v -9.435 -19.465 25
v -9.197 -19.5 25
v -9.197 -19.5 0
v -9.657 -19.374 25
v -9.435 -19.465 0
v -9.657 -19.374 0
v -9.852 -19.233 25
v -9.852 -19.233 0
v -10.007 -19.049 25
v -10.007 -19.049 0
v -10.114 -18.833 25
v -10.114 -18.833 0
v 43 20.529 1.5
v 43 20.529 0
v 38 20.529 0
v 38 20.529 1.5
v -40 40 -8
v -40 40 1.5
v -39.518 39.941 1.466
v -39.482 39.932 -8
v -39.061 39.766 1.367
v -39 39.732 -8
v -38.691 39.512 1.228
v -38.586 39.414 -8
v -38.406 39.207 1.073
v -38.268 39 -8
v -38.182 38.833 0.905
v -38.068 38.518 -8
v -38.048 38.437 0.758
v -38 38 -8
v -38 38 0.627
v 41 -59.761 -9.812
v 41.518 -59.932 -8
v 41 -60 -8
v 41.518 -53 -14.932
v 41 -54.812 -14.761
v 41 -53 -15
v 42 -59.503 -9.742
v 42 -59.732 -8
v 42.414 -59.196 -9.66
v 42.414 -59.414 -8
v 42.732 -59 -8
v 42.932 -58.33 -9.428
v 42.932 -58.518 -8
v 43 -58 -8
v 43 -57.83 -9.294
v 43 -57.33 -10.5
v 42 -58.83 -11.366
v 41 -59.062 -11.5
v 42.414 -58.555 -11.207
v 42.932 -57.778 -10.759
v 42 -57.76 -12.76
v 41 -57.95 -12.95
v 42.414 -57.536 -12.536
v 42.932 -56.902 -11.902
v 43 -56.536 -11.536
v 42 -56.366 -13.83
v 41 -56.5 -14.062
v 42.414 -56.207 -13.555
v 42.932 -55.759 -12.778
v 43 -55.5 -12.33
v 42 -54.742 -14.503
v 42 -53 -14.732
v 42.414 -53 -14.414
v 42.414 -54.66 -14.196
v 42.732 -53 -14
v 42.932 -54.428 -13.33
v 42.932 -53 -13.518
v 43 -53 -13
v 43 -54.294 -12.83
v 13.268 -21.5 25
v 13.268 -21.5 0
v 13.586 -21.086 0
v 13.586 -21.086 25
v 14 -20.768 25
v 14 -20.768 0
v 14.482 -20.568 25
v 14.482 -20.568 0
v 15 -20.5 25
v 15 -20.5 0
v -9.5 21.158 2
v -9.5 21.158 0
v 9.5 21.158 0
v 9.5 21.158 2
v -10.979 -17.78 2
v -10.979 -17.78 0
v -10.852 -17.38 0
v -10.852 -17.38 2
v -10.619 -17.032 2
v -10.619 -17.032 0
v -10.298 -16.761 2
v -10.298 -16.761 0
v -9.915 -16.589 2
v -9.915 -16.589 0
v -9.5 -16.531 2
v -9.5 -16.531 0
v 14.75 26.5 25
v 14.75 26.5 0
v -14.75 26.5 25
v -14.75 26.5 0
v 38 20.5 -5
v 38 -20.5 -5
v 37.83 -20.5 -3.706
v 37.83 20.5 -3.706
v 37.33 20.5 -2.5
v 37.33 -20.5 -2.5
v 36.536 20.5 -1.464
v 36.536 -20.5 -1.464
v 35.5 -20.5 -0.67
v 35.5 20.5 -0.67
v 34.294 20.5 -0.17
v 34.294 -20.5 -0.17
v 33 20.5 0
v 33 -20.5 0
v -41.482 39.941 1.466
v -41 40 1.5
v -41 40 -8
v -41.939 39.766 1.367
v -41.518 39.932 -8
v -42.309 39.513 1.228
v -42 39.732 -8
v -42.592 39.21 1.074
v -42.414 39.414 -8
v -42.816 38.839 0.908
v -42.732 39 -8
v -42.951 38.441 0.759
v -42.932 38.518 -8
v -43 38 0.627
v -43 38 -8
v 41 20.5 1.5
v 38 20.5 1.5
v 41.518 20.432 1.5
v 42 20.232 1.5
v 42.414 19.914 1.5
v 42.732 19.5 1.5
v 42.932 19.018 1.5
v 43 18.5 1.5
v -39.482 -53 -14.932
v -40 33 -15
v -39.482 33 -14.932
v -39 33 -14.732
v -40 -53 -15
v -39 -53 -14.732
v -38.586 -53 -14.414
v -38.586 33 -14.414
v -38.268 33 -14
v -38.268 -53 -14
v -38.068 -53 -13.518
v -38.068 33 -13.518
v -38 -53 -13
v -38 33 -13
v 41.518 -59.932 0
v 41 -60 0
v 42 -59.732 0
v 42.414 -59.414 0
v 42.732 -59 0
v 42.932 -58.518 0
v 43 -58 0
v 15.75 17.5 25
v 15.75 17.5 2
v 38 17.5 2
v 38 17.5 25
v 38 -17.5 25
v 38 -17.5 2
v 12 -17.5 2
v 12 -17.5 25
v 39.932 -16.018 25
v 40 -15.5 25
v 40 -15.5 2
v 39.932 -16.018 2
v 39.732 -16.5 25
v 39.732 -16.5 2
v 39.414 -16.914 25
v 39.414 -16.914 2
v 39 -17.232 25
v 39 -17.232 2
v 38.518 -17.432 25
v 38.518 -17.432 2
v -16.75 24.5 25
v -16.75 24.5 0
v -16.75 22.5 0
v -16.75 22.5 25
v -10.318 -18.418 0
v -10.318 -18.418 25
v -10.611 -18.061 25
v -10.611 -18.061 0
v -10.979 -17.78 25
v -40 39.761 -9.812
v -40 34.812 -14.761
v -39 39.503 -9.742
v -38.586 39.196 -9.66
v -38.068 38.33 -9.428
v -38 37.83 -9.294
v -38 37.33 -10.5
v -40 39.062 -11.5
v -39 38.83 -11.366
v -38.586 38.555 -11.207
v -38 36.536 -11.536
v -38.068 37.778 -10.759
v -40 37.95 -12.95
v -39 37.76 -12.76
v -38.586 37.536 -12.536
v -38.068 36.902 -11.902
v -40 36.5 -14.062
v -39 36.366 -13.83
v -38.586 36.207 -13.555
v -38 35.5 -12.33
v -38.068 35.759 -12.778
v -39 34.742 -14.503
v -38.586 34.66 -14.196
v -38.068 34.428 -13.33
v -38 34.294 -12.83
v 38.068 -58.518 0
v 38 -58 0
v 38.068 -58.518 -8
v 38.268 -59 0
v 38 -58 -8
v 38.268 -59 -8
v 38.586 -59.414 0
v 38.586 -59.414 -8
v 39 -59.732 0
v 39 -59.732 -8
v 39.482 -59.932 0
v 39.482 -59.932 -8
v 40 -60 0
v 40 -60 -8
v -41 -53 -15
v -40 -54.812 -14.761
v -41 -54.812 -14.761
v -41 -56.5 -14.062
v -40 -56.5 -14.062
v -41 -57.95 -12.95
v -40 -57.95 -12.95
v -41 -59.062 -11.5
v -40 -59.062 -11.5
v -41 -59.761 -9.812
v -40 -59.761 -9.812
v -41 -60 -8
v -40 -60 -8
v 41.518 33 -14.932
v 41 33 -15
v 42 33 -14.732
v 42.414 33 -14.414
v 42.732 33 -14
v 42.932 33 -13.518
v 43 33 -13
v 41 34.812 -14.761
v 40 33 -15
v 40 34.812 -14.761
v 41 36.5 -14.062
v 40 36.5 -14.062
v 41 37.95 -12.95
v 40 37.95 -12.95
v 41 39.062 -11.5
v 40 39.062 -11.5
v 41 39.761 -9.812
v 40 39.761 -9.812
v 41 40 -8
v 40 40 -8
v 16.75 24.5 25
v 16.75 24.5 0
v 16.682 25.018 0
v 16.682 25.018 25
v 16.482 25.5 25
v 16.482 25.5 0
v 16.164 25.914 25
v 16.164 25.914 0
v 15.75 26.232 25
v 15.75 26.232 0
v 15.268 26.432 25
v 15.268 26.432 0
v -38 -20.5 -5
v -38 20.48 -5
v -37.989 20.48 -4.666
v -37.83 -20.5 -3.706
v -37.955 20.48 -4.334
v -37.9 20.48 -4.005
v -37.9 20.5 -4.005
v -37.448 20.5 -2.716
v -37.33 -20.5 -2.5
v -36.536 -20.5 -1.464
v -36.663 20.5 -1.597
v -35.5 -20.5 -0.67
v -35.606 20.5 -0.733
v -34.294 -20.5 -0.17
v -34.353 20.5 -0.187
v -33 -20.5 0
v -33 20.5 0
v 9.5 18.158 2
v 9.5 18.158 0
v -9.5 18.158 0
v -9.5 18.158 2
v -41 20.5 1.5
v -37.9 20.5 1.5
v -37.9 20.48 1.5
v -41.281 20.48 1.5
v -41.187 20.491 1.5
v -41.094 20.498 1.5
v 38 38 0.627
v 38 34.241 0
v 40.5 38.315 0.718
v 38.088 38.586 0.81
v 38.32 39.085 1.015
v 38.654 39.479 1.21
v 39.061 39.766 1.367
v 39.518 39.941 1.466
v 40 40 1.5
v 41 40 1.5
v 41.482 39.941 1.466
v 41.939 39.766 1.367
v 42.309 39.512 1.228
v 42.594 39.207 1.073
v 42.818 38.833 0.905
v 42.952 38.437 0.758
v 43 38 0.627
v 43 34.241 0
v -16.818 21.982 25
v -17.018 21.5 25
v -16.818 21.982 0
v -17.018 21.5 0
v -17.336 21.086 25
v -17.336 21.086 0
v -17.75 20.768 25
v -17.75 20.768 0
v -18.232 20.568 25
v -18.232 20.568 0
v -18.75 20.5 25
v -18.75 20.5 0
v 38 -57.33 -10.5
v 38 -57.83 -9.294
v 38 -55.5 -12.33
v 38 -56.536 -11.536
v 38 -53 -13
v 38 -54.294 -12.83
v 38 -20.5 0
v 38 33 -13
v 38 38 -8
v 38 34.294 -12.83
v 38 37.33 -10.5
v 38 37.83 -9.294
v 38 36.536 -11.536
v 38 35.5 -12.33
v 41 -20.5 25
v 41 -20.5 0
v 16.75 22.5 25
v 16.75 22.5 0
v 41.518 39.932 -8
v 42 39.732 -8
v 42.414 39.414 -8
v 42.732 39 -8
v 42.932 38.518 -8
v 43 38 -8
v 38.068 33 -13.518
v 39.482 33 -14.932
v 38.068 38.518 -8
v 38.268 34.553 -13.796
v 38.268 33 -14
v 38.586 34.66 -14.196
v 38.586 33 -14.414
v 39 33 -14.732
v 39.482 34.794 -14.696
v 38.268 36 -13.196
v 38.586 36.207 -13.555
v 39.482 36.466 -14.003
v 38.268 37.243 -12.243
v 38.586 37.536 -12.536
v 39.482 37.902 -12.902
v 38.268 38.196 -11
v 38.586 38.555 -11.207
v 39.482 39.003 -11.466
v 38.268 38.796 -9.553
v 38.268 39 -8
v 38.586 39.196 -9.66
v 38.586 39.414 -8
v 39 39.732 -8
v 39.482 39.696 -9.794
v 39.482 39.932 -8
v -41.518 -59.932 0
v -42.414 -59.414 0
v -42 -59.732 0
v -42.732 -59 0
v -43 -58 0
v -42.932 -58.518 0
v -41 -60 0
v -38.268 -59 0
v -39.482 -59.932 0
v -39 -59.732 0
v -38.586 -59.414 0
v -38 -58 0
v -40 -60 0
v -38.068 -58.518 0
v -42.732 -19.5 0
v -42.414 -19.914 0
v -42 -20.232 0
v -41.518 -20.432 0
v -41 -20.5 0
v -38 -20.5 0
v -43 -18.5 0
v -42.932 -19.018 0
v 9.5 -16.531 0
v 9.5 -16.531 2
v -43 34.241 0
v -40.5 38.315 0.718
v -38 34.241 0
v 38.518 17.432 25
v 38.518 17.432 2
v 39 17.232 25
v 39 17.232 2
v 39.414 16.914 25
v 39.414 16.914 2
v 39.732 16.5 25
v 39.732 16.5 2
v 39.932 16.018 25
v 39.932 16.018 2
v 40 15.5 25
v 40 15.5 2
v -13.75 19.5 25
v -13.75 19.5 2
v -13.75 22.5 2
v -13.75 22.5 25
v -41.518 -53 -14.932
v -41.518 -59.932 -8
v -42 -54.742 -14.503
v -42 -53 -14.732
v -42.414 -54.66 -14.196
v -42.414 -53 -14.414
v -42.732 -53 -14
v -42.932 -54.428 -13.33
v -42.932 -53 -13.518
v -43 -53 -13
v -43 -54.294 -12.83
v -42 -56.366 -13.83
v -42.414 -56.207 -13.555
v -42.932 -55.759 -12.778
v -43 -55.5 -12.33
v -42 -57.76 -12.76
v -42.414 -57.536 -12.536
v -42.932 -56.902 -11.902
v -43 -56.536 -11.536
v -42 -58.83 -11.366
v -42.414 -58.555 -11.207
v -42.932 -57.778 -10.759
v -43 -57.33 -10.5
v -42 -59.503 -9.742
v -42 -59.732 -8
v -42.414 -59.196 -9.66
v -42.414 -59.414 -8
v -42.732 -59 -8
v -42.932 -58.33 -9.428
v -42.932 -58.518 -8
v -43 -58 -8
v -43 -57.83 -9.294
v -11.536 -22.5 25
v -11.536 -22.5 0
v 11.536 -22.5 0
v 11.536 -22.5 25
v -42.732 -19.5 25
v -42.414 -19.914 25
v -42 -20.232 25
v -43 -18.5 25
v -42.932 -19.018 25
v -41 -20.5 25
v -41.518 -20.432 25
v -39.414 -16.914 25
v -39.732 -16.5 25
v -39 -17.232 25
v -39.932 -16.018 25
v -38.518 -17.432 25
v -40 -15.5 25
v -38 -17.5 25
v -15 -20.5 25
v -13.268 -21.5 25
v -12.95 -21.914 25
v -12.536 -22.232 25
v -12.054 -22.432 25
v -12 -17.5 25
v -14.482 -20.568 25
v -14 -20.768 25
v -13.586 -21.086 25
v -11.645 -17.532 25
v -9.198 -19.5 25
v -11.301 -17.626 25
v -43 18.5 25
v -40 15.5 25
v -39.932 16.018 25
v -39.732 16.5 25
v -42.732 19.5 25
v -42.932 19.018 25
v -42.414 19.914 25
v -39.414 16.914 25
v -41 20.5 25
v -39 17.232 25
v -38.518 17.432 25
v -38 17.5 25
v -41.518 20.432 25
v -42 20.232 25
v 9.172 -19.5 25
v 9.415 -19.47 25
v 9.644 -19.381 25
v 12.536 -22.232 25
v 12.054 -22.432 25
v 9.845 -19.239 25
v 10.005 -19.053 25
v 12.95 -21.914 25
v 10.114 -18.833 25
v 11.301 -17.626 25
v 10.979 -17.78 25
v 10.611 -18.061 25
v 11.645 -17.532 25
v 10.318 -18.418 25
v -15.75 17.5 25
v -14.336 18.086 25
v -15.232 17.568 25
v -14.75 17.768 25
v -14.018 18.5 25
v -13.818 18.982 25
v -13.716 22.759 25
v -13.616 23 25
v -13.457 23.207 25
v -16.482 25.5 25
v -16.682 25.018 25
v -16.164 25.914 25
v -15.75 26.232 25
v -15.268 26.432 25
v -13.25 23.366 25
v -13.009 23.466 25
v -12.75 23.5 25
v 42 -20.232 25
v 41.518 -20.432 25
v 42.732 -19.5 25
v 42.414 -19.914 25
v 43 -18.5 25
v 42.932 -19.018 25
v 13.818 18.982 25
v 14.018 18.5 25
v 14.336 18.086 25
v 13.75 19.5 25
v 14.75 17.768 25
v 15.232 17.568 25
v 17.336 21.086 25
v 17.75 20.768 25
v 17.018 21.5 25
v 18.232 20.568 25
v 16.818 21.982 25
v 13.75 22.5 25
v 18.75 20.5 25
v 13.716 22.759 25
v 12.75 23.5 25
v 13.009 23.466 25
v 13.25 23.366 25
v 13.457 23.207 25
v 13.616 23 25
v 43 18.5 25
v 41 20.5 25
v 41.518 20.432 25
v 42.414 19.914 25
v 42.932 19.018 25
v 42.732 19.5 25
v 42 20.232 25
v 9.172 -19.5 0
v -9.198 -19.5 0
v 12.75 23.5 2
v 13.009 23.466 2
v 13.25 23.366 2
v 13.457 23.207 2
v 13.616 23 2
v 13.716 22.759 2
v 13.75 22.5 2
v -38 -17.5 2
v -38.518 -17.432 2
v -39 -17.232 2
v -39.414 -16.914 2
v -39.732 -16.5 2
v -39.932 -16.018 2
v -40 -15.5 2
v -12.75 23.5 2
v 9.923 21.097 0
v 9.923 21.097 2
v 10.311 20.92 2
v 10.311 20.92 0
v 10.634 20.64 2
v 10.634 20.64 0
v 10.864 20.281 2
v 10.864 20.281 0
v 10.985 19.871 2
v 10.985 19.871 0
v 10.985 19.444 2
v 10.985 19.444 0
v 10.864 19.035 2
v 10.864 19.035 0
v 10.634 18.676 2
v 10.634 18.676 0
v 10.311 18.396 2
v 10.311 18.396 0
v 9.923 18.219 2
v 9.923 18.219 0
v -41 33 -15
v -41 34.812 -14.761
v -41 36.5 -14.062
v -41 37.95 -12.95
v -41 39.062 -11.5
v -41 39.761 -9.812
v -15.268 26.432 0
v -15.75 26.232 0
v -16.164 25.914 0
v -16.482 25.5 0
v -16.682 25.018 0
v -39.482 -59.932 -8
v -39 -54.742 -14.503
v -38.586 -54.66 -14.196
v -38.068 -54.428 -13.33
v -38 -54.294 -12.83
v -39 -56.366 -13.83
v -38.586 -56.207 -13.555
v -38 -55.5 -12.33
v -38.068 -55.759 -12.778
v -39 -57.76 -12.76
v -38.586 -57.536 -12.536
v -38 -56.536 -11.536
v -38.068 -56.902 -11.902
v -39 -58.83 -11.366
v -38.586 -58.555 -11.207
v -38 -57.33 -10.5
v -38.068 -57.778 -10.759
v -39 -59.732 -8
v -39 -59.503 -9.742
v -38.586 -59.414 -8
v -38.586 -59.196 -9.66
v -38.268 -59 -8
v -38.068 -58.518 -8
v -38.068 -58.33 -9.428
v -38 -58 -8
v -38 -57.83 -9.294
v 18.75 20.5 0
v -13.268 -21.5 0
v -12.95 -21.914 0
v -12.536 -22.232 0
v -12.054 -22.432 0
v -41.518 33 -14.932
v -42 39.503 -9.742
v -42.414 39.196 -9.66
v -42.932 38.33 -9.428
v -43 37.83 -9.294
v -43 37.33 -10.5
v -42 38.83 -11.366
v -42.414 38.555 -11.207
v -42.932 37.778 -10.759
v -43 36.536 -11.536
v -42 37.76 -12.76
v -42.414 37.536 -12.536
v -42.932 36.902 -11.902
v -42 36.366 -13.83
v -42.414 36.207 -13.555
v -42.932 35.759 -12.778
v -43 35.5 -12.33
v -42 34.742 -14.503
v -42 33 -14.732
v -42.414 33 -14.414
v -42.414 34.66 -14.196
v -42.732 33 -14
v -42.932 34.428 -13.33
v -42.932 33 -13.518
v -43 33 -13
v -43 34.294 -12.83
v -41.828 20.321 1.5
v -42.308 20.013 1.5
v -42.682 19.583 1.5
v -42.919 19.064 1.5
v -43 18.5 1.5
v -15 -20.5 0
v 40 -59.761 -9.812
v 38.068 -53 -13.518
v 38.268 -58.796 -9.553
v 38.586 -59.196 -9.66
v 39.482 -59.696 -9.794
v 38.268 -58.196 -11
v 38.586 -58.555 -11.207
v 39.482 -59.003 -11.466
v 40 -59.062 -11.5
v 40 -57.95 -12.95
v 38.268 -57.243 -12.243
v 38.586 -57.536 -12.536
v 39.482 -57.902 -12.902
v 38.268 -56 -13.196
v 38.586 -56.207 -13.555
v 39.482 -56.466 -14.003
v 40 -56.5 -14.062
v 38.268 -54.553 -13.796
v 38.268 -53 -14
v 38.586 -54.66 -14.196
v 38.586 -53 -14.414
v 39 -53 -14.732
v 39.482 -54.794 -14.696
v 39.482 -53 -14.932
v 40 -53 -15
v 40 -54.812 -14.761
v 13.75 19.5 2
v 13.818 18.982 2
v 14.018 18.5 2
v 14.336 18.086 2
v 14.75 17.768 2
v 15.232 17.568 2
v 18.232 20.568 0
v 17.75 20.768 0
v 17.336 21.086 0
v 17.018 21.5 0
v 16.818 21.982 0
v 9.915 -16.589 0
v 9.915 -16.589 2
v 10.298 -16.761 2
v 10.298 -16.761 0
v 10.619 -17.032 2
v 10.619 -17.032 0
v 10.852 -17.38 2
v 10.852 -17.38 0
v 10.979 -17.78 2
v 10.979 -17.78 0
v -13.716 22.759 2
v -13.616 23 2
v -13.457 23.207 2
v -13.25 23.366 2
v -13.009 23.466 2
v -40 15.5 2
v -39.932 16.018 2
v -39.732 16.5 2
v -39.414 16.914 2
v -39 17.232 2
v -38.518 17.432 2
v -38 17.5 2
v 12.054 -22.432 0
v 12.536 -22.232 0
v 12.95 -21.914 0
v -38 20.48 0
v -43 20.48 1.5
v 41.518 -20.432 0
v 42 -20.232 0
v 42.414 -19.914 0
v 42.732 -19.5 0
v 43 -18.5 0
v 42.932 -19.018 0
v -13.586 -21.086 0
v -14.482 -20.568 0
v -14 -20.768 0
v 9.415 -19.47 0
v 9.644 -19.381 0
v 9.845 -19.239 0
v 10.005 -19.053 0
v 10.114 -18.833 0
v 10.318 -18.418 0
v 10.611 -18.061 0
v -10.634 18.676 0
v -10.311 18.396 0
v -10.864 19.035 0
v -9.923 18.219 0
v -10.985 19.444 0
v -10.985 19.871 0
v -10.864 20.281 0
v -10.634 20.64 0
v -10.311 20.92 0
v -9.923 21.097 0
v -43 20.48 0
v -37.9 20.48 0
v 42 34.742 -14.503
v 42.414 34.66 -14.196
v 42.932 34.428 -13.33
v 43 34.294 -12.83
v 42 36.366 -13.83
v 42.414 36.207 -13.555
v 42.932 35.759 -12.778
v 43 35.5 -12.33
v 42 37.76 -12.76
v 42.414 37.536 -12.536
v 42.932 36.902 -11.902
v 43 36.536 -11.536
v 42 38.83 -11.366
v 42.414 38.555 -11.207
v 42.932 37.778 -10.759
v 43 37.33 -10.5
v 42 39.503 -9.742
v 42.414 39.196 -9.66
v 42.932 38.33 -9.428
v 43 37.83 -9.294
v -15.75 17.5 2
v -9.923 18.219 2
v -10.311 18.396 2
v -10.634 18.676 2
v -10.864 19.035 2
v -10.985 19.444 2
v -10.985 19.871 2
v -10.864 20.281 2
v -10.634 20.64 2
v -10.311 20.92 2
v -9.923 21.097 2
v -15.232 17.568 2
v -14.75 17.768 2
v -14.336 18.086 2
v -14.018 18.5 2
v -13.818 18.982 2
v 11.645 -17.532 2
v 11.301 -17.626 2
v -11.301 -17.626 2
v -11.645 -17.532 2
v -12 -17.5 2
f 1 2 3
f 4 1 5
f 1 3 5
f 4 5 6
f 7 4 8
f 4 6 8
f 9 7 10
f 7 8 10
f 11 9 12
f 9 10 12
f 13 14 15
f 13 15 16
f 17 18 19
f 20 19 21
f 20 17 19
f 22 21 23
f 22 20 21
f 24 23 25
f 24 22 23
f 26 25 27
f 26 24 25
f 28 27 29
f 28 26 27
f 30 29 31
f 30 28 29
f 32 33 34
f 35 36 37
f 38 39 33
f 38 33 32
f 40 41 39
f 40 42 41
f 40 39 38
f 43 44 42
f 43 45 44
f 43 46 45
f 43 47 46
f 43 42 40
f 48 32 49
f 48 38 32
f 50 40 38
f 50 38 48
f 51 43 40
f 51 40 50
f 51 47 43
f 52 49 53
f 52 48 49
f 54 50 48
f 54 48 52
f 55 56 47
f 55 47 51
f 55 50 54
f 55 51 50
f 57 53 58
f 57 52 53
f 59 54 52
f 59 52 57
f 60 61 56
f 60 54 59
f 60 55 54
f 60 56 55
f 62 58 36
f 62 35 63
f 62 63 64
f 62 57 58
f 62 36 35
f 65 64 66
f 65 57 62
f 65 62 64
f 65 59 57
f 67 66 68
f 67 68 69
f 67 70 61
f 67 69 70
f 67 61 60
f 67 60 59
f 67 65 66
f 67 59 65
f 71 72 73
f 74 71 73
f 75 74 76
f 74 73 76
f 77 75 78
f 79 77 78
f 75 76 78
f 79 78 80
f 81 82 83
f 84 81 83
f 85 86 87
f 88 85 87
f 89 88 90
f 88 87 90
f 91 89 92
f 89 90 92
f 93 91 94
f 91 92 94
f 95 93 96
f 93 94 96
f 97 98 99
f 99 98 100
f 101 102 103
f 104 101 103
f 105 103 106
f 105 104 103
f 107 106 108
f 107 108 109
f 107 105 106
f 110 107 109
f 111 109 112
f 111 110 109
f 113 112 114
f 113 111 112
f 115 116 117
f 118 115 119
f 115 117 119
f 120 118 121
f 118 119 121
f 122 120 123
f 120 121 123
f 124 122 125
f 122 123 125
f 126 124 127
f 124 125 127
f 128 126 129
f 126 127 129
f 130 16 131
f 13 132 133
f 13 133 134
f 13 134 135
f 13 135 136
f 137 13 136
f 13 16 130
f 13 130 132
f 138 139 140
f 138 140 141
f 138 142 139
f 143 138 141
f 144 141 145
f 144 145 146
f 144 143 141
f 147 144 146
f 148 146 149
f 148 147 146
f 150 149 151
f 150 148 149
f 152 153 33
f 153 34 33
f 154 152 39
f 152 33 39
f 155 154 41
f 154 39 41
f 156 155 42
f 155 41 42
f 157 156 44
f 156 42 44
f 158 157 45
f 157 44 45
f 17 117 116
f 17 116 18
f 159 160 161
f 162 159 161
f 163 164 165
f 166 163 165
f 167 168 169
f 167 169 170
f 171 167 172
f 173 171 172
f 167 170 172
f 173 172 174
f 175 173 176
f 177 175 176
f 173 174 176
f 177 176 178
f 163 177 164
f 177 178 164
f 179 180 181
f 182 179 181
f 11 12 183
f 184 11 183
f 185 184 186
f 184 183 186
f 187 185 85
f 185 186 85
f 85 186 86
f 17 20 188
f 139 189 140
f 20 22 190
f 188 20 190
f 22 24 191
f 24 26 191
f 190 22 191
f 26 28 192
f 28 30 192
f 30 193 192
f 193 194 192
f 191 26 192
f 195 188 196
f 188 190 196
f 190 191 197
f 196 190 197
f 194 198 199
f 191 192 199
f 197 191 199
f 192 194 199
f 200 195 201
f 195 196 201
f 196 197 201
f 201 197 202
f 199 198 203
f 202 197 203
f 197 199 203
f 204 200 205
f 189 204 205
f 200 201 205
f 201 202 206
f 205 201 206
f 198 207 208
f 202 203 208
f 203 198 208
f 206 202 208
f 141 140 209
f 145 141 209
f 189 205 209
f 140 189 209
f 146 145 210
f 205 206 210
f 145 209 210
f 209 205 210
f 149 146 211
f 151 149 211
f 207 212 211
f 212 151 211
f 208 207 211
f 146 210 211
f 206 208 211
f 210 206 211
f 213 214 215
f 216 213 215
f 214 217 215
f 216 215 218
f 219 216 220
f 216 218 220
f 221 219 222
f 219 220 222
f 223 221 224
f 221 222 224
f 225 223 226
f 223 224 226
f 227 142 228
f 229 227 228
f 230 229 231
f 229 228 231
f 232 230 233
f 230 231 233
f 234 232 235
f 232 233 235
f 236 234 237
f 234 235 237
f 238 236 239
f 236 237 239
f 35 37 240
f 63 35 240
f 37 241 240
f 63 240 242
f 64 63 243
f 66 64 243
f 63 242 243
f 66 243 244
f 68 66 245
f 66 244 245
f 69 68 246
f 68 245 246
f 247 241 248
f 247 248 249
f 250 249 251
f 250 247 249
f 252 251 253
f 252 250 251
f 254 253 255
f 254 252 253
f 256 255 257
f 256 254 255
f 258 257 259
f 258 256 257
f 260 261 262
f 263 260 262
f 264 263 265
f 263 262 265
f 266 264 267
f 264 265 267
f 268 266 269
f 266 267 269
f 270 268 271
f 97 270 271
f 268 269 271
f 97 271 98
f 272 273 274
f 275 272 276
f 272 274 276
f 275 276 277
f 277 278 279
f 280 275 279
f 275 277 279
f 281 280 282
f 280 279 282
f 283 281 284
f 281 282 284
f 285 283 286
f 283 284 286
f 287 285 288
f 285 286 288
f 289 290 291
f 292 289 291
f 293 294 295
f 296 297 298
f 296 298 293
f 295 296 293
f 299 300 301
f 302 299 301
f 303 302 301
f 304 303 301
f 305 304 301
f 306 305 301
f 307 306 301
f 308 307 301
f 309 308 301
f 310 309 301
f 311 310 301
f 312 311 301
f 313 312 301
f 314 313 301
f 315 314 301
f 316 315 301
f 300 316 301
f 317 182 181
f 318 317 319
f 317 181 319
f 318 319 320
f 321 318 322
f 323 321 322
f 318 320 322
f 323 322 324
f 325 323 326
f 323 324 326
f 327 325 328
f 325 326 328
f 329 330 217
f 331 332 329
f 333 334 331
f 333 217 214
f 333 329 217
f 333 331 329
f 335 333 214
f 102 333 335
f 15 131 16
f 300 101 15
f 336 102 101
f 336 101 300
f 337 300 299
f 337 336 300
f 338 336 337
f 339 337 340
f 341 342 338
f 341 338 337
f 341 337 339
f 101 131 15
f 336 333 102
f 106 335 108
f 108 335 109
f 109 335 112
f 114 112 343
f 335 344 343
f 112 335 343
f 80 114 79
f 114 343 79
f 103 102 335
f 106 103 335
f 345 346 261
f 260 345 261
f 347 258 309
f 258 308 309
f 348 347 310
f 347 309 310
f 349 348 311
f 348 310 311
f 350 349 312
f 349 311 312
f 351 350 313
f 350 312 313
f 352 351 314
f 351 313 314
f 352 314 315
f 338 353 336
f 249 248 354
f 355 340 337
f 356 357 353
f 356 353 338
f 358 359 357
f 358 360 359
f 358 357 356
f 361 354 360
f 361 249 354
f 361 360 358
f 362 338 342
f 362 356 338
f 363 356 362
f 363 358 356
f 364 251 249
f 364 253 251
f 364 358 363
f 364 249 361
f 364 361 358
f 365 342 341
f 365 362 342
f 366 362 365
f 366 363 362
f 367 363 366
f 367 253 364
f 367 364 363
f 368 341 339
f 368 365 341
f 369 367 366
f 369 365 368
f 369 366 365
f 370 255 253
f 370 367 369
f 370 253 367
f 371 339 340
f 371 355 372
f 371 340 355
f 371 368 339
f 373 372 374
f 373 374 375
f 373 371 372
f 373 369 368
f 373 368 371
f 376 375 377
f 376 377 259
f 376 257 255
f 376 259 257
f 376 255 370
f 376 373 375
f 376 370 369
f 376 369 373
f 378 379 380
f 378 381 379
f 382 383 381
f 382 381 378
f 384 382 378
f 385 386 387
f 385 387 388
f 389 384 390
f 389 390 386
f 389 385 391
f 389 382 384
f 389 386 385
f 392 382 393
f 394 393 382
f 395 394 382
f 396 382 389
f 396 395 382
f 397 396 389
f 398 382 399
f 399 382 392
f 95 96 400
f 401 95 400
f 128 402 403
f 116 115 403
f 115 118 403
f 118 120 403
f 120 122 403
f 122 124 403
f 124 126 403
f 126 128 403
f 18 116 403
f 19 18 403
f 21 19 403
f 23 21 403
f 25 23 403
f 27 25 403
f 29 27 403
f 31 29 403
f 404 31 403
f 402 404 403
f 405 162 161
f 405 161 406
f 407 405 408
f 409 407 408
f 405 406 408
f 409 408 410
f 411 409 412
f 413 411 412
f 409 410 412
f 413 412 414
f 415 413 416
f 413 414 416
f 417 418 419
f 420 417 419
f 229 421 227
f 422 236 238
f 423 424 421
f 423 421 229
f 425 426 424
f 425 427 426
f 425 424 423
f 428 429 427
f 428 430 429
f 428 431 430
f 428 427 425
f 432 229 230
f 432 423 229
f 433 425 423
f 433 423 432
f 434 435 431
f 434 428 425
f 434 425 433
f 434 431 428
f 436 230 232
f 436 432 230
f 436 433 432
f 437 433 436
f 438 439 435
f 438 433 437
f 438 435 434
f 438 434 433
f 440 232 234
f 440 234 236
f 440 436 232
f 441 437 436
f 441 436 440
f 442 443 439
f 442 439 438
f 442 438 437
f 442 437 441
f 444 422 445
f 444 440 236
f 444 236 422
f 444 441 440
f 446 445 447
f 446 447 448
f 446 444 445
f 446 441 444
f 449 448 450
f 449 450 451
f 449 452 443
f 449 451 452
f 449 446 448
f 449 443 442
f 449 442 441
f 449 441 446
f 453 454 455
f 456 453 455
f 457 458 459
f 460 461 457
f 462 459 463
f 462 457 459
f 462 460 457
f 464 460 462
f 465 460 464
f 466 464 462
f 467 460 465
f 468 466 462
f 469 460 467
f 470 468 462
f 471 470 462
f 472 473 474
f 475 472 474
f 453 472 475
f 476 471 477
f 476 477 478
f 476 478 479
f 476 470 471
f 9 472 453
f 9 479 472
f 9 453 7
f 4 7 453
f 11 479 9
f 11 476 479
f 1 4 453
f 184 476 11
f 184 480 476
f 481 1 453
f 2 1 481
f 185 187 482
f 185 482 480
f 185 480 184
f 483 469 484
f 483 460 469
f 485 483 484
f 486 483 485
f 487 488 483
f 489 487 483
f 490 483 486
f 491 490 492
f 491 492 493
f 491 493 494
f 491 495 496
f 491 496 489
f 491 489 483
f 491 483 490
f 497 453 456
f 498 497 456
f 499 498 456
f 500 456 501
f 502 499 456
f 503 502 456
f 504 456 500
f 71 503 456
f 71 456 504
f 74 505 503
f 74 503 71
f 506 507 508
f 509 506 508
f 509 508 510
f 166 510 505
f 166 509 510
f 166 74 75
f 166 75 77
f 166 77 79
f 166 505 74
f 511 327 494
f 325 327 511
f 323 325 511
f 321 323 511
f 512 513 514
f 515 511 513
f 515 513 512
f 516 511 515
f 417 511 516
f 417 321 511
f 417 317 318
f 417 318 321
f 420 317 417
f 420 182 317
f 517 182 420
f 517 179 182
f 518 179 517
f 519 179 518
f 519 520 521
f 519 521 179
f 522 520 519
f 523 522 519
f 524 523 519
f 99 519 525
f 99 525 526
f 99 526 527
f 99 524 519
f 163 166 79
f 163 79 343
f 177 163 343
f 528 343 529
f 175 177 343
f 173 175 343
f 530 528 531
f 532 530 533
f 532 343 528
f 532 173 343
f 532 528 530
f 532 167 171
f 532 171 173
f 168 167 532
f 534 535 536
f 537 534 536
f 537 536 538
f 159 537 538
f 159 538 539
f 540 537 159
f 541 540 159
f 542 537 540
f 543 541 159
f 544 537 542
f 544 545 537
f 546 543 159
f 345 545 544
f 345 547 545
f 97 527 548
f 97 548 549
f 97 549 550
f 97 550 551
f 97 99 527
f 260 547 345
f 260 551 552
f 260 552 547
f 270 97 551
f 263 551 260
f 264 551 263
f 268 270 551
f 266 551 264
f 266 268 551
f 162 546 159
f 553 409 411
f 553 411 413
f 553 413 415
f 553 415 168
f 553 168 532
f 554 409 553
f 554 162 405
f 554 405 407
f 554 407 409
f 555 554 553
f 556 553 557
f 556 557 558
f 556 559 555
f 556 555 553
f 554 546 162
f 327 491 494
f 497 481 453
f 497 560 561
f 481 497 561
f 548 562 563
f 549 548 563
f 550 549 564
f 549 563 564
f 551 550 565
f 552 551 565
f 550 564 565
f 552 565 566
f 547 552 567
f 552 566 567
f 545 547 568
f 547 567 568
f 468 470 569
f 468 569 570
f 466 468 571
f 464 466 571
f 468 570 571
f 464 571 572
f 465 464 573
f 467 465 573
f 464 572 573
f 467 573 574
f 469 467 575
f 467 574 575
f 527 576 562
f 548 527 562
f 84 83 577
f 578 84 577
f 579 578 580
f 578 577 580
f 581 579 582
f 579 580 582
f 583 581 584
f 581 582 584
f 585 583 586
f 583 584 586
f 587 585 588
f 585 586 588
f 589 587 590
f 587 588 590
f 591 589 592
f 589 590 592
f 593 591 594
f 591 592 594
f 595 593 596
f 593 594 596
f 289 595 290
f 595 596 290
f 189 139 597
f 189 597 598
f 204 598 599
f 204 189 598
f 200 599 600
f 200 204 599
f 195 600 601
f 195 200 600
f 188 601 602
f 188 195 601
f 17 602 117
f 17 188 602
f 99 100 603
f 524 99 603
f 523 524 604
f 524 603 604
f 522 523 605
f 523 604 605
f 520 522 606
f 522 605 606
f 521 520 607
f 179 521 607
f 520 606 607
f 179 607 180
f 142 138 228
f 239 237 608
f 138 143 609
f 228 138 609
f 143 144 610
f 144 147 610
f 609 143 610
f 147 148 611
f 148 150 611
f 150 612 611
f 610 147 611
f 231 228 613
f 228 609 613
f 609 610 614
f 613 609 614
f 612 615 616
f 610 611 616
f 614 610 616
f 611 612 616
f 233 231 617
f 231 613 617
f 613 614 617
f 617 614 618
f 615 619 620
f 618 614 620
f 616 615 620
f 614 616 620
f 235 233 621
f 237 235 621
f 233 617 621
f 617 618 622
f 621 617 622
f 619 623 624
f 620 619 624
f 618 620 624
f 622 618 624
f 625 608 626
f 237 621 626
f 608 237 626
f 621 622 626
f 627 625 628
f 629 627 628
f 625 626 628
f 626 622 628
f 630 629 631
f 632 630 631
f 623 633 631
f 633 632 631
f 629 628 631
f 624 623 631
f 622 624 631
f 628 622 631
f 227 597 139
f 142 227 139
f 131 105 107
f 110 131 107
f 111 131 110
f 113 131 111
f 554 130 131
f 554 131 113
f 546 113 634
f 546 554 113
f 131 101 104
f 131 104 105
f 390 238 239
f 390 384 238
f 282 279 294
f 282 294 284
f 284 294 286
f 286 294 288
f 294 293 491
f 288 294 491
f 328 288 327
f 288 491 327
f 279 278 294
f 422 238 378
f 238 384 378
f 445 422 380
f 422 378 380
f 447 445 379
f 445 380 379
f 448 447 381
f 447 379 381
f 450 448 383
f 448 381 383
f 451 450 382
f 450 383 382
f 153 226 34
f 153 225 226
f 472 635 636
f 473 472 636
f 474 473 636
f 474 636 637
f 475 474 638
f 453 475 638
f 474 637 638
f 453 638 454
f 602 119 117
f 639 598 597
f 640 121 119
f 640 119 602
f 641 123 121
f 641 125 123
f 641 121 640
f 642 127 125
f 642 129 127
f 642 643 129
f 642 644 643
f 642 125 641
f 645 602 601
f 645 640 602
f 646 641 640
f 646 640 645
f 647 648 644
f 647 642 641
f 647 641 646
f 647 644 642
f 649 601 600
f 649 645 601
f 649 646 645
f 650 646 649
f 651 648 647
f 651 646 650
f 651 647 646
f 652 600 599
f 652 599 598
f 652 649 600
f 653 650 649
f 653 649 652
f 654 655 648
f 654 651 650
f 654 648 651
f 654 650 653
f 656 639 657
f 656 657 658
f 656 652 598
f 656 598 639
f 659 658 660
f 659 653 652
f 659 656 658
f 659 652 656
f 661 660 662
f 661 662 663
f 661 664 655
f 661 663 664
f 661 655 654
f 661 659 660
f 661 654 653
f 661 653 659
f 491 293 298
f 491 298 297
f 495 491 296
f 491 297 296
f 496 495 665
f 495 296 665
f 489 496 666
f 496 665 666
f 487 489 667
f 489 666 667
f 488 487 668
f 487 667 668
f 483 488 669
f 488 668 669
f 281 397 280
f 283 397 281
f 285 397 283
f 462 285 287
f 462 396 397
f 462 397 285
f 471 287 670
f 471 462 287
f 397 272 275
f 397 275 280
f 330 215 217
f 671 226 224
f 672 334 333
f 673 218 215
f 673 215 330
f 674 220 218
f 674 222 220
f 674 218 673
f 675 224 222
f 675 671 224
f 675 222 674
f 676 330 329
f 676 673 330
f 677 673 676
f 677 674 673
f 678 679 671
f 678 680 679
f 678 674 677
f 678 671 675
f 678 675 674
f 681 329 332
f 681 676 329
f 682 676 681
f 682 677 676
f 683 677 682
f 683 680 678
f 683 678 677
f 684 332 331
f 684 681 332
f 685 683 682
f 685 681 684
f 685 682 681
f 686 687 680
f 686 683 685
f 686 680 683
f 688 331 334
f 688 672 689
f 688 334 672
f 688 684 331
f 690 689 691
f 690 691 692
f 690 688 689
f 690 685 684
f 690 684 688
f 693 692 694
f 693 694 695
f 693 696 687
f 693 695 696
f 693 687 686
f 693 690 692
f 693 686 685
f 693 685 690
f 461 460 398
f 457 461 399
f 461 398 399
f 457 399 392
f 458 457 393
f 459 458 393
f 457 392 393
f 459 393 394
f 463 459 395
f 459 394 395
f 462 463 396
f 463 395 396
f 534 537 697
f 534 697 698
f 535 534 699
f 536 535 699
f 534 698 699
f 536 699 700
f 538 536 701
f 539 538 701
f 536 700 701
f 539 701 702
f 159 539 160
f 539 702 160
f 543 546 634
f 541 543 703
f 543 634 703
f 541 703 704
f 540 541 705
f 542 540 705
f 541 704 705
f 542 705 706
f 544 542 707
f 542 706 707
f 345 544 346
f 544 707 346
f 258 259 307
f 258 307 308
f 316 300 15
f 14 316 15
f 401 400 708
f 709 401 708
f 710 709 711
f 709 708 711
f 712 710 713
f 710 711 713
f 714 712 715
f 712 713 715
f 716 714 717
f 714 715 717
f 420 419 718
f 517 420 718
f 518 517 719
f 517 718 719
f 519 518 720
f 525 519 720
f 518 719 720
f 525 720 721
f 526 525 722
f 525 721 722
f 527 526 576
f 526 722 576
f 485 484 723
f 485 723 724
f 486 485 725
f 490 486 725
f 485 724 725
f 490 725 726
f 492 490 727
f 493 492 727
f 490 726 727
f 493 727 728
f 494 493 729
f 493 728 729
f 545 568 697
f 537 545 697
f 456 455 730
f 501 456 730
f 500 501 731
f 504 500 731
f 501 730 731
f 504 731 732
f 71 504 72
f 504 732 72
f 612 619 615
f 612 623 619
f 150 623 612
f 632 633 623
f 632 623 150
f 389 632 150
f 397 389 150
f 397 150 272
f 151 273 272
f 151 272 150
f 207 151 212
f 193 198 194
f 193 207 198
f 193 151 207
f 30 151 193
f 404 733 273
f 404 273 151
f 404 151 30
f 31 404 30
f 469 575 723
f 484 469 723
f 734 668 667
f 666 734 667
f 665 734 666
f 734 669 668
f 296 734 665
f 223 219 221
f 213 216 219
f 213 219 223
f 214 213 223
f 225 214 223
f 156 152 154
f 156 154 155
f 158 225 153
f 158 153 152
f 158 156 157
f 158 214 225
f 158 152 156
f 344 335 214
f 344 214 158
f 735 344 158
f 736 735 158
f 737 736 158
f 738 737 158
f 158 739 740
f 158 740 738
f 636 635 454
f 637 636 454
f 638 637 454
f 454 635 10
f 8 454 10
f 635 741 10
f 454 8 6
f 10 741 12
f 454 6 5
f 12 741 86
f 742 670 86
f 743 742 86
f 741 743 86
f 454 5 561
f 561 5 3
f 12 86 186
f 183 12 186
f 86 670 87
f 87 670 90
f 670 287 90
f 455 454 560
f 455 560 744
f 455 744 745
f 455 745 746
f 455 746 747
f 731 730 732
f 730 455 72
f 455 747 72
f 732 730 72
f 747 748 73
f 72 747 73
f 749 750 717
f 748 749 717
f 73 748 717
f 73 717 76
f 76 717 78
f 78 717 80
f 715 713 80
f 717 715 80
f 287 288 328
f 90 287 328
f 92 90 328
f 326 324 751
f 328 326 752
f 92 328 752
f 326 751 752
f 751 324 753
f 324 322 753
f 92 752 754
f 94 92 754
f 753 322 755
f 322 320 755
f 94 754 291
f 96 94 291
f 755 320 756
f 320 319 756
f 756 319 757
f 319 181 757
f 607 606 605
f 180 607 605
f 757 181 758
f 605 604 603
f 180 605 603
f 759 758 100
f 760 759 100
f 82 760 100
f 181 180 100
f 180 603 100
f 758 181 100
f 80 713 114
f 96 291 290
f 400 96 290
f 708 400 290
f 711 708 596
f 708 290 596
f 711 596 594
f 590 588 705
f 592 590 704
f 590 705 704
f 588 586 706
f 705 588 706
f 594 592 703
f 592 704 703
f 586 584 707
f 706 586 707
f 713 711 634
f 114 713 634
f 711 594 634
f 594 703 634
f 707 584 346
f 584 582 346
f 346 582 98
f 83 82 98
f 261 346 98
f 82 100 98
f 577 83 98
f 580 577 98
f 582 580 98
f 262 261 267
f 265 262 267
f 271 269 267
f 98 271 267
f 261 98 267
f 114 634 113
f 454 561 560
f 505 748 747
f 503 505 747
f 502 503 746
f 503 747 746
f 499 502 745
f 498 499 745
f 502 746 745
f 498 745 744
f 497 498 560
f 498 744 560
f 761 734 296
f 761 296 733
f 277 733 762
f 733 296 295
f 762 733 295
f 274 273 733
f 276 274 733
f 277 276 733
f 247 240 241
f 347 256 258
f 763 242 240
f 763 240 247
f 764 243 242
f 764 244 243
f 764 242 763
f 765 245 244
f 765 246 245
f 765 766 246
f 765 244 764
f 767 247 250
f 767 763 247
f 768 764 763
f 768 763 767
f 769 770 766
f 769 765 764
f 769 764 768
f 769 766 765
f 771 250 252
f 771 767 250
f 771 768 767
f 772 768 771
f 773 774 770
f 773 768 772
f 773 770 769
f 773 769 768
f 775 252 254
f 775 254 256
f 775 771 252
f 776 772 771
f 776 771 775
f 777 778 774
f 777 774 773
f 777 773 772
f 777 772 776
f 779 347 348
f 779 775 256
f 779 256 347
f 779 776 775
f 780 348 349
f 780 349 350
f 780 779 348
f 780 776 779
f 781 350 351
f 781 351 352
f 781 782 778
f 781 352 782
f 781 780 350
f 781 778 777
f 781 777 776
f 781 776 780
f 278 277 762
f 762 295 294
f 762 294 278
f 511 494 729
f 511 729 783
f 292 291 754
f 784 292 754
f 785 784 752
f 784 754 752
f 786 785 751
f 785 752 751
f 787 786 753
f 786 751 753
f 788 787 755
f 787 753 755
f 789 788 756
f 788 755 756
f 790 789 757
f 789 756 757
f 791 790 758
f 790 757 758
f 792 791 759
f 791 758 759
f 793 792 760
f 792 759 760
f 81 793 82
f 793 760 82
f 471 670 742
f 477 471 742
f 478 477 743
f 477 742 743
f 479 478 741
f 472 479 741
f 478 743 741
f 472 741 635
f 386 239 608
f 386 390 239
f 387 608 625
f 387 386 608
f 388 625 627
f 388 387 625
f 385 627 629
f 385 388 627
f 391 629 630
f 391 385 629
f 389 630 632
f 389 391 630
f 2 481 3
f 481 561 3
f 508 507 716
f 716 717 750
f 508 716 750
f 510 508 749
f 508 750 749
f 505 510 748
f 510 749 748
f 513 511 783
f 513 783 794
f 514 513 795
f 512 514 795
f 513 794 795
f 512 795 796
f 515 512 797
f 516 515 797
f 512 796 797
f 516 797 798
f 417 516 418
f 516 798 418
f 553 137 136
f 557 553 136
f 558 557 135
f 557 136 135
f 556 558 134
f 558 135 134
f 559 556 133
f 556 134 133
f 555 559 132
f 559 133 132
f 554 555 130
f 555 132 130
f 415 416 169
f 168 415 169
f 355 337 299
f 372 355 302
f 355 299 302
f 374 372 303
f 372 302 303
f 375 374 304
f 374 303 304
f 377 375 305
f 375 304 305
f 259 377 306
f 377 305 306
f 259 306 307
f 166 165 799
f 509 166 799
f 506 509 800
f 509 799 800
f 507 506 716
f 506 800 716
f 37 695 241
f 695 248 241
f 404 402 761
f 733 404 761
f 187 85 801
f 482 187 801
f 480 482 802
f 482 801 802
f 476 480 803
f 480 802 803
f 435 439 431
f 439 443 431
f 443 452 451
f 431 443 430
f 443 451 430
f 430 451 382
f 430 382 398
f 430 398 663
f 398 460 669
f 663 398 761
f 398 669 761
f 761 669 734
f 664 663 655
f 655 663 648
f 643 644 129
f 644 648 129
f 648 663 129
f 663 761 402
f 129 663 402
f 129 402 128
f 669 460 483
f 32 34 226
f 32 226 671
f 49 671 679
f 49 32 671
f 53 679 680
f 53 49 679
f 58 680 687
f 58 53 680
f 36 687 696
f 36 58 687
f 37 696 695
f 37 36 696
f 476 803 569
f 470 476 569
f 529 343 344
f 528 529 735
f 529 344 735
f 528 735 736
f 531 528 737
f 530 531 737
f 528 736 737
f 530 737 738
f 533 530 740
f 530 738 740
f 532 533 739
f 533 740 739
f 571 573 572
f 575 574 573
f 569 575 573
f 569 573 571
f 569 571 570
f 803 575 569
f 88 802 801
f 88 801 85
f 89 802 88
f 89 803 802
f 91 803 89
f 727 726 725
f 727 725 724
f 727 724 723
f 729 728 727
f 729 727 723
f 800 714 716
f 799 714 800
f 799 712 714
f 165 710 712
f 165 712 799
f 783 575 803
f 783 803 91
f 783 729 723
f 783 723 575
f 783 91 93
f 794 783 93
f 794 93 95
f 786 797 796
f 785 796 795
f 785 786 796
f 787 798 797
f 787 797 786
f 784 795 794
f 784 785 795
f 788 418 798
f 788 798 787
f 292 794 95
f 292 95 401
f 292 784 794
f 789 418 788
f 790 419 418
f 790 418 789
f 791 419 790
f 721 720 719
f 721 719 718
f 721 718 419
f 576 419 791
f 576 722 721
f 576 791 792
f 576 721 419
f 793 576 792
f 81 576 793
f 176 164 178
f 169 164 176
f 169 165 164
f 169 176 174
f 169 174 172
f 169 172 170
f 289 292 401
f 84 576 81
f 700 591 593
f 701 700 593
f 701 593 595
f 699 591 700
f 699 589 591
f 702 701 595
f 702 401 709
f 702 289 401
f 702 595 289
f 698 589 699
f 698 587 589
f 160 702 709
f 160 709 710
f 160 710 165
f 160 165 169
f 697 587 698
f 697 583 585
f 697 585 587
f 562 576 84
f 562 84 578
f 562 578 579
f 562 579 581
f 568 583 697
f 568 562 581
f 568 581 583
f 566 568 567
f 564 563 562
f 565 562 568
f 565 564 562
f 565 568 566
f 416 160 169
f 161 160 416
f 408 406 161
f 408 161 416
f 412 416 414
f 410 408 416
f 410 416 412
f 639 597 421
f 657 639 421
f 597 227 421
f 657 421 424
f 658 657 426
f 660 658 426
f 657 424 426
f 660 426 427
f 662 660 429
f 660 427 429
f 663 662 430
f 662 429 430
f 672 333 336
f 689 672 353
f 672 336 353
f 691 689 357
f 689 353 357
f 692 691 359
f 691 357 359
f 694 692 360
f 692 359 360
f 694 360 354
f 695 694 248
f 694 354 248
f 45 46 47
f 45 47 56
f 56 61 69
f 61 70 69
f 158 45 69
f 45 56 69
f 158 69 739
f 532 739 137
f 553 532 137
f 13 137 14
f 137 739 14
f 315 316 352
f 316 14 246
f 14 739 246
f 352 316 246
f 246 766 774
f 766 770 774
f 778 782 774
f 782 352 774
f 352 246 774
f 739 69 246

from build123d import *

# Parameters (mm, degrees)
F1_DEPTH      = 2
F2_DEPTH      = 25
F3_W          = 5
F3_H          = 60
F4_DEPTH      = 15
F3_H_2        = 40
F5_DEPTH      = 15
F5_DEPTH_BACK = 1.5
F6_R          = 7
F8_DEPTH      = 86.001
F7_W          = 6.048347801
F7_H          = 1.5
F9_DEPTH      = 5.1
F10_W         = 6
F10_H         = 1.5
F11_DEPTH     = 5.1
F12_T1_DEPTH  = 41
F12_T3_DEPTH  = 40.980202511
F12_T8_DEPTH  = 53.480202511
F13_R         = 2


# Not quite as in the source:
# - a fillet or chamfer that OpenCascade refuses, or shapes differently, is made with other operations: its cross-section is extruded or revolved along the edge and cut away or added


with BuildPart() as f1:
    # F0 (on Top) → F1 (new body)
    with BuildSketch(Plane.XY):
        with BuildLine():
            ThreePointArc((40, 15.5), (39.4142135624, 16.9142135624), (38, 17.5))
            Line((38, 17.5), (15.75, 17.5))
            ThreePointArc((15.75, 17.5), (14.3357864376, 18.0857864376), (13.75, 19.5))
            Line((13.75, 19.5), (13.75, 22.5))
            ThreePointArc((13.75, 22.5), (13.4571067812, 23.2071067812), (12.75, 23.5))
            Line((12.75, 23.5), (-12.75, 23.5))
            ThreePointArc((-12.75, 23.5), (-13.4571067812, 23.2071067812), (-13.75, 22.5))
            Line((-13.75, 22.5), (-13.75, 19.5))
            ThreePointArc((-13.75, 19.5), (-14.3357864376, 18.0857864376), (-15.75, 17.5))
            Line((-15.75, 17.5), (-38, 17.5))
            ThreePointArc((-38, 17.5), (-39.4142135624, 16.9142135624), (-40, 15.5))
            Line((-40, 15.5), (-40, -15.5))
            ThreePointArc((-40, -15.5), (-39.4142135624, -16.9142135624), (-38, -17.5))
            Line((-38, -17.5), (-12, -17.5))
            ThreePointArc((-12, -17.5), (-11.4705903261, -17.5713410366), (-10.978949287, -17.7802746029))
            ThreePointArc((-10.978949287, -17.7802746029), (-10.4680840625, -16.8849116385), (-9.5, -16.5306922667))
            Line((-9.5, -16.5306922667), (0, -16.5306922667))
            Line((0, -16.5306922667), (9.5, -16.5306922667))
            ThreePointArc((9.5, -16.5306922667), (10.4680840625, -16.8849116385), (10.978949287, -17.7802746029))
            ThreePointArc((10.978949287, -17.7802746029), (11.4705903261, -17.5713410366), (12, -17.5))
            Line((12, -17.5), (38, -17.5))
            ThreePointArc((38, -17.5), (39.4142135624, -16.9142135624), (40, -15.5))
            Line((40, -15.5), (40, 15.5))
        make_face()
        with BuildLine():
            ThreePointArc((-9.5, 18.1578074247), (-11, 19.6578074247), (-9.5, 21.1578074247))
            Line((-9.5, 21.1578074247), (0, 21.1578074247))
            Line((0, 21.1578074247), (9.5, 21.1578074247))
            ThreePointArc((9.5, 21.1578074247), (11, 19.6578074247), (9.5, 18.1578074247))
            Line((9.5, 18.1578074247), (0, 18.1578074247))
            Line((0, 18.1578074247), (-9.5, 18.1578074247))
        make_face(mode=Mode.SUBTRACT)
    extrude(amount=F1_DEPTH)

    # F0 (on Top) → F2 (join)
    with BuildSketch(Plane.XY):
        with BuildLine():
            ThreePointArc((43, 18.5), (42.4142135624, 19.9142135624), (41, 20.5))
            Line((41, 20.5), (18.75, 20.5))
            ThreePointArc((18.75, 20.5), (17.3357864376, 21.0857864376), (16.75, 22.5))
            Line((16.75, 22.5), (16.75, 24.5))
            ThreePointArc((16.75, 24.5), (16.1642135624, 25.9142135624), (14.75, 26.5))
            Line((14.75, 26.5), (-14.75, 26.5))
            ThreePointArc((-14.75, 26.5), (-16.1642135624, 25.9142135624), (-16.75, 24.5))
            Line((-16.75, 24.5), (-16.75, 22.5))
            ThreePointArc((-16.75, 22.5), (-17.3357864376, 21.0857864376), (-18.75, 20.5))
            Line((-18.75, 20.5), (-41, 20.5))
            ThreePointArc((-41, 20.5), (-42.4142135624, 19.9142135624), (-43, 18.5))
            Line((-43, 18.5), (-43, -18.5))
            ThreePointArc((-43, -18.5), (-42.4142135624, -19.9142135624), (-41, -20.5))
            Line((-41, -20.5), (-15, -20.5))
            ThreePointArc((-15, -20.5), (-14, -20.7679491924), (-13.2679491924, -21.5))
            ThreePointArc((-13.2679491924, -21.5), (-12.5358983849, -22.2320508076), (-11.5358983849, -22.5))
            Line((-11.5358983849, -22.5), (11.5358983849, -22.5))
            ThreePointArc((11.5358983849, -22.5), (12.5358983849, -22.2320508076), (13.2679491924, -21.5))
            ThreePointArc((13.2679491924, -21.5), (14, -20.7679491924), (15, -20.5))
            Line((15, -20.5), (41, -20.5))
            ThreePointArc((41, -20.5), (42.4142135624, -19.9142135624), (43, -18.5))
            Line((43, -18.5), (43, 18.5))
        make_face()
        with BuildLine():
            Line((15.75, 17.5), (38, 17.5))
            ThreePointArc((38, 17.5), (39.4142135624, 16.9142135624), (40, 15.5))
            Line((40, 15.5), (40, -15.5))
            ThreePointArc((40, -15.5), (39.4142135624, -16.9142135624), (38, -17.5))
            Line((38, -17.5), (12, -17.5))
            ThreePointArc((12, -17.5), (11.4705903261, -17.5713410366), (10.978949287, -17.7802746029))
            ThreePointArc((10.978949287, -17.7802746029), (10.4542270396, -18.2309113684), (10.1143819168, -18.8333333333))
            ThreePointArc((10.1143819168, -18.8333333333), (9.7489231444, -19.3164965809), (9.1715728753, -19.5))
            Line((9.1715728753, -19.5), (0, -19.5))
            Line((0, -19.5), (-9.1715728753, -19.5))
            Line((-9.1715728753, -19.5), (-9.1981146163, -19.5))
            ThreePointArc((-9.1981146163, -19.5), (-9.1973546351, -19.4998436487), (-9.1965947349, -19.4996869043))
            ThreePointArc((-9.1965947349, -19.4996869043), (-9.7590938823, -19.3092089139), (-10.1143819168, -18.8333333333))
            ThreePointArc((-10.1143819168, -18.8333333333), (-10.4542270396, -18.2309113684), (-10.978949287, -17.7802746029))
            ThreePointArc((-10.978949287, -17.7802746029), (-11.4705903261, -17.5713410366), (-12, -17.5))
            Line((-12, -17.5), (-38, -17.5))
            ThreePointArc((-38, -17.5), (-39.4142135624, -16.9142135624), (-40, -15.5))
            Line((-40, -15.5), (-40, 15.5))
            ThreePointArc((-40, 15.5), (-39.4142135624, 16.9142135624), (-38, 17.5))
            Line((-38, 17.5), (-15.75, 17.5))
            ThreePointArc((-15.75, 17.5), (-14.3357864376, 18.0857864376), (-13.75, 19.5))
            Line((-13.75, 19.5), (-13.75, 22.5))
            ThreePointArc((-13.75, 22.5), (-13.4571067812, 23.2071067812), (-12.75, 23.5))
            Line((-12.75, 23.5), (12.75, 23.5))
            ThreePointArc((12.75, 23.5), (13.4571067812, 23.2071067812), (13.75, 22.5))
            Line((13.75, 22.5), (13.75, 19.5))
            ThreePointArc((13.75, 19.5), (14.3357864376, 18.0857864376), (15.75, 17.5))
        make_face(mode=Mode.SUBTRACT)
    extrude(amount=F2_DEPTH)

    # F3 (on Top) → F4 (join)
    with BuildSketch(Plane.XY):
        with Locations((-40.5, -30)):
            Rectangle(F3_W, F3_H)
        with Locations((40.5, -30)):
            Rectangle(F3_W, F3_H)
    extrude(amount=-F4_DEPTH)

    # F3 (on Top) → F5 (join, two sides)
    with BuildSketch(Plane.XY) as f5_sk:
        with Locations((-40.5, 20)):
            Rectangle(F3_W, F3_H_2)
        with Locations((40.5, 20)):
            Rectangle(F3_W, F3_H_2)
    extrude(amount=-F5_DEPTH)
    extrude(f5_sk.sketch, amount=F5_DEPTH_BACK)

    # F6
    f6_edges = [f1.edges().sort_by_distance(p)[0] for p in [
        (40.5, 40, -15),
        (-40.5, 40, -15),
        (-40.5, -60, -15),
        (40.5, -60, -15),
    ]]
    fillet(f6_edges, radius=F6_R)

    # F7 (on face) → F8 (cut, through all)
    with BuildSketch(Plane(origin=(-43, 0, 0), x_dir=(0, -1, 0), z_dir=(-1, 0, 0))):
        with BuildLine():
            Line((-26.5285503119, 1.5), (-40, 1.5))
            add(Edge.make_bspline(
                [(-40, 1.5), (-39.5081001265, 1.219408998), (-38.2821576057, 0.5201031862), (-35.7543121769, 0.1947861269), (-34.240745008, 0)],
                knots=[0, 0, 0, 0, 0.4012421995, 1, 1, 1, 1], degree=3))
            Line((-34.240745008, 0), (-26.5285503119, 0))
            Line((-26.5285503119, 0), (-26.5285503119, 1.5))
        make_face()
    extrude(amount=-F8_DEPTH, mode=Mode.SUBTRACT)

    # F7 (on face) → F9 (cut)
    with BuildSketch(Plane(origin=(-43, 0, 0), x_dir=(0, -1, 0), z_dir=(-1, 0, 0))):
        with Locations((-23.5043764114, 0.75)):
            Rectangle(F7_W, F7_H)
    extrude(amount=-F9_DEPTH, mode=Mode.SUBTRACT)

    # F10 (on face) → F11 (cut)
    with BuildSketch(Plane.YZ.offset(43)):
        with Locations((23.5285503119, 0.75)):
            Rectangle(F10_W, F10_H)
    extrude(amount=-F11_DEPTH, mode=Mode.SUBTRACT)

    # F12: fillet of radius 5 on 2 edges, made by hand

    # F12_s2 → F12_t1 (join)
    with BuildSketch(Plane.XZ.offset(-20.5)):
        with BuildLine():
            ThreePointArc((38, -5), (36.5355339059, -1.4644660941), (33, 0))
            Line((33, 0), (38, 0))
            Line((38, 0), (38, -5))
        make_face()
    extrude(amount=F12_T1_DEPTH)

    # F12_s4 → F12_t3 (join)
    with BuildSketch(Plane.XZ.offset(-20.480202511)):
        with BuildLine():
            ThreePointArc((-38, -5), (-36.5355339059, -1.4644660941), (-33, 0))
            Line((-33, 0), (-38, 0))
            Line((-38, 0), (-38, -5))
        make_face()
    extrude(amount=F12_T3_DEPTH)


with BuildPart() as f12_tool6:
    # F12_s7 → F12_t8 (new body)
    with BuildSketch(Plane.XZ.offset(20.5)):
        with BuildLine():
            ThreePointArc((-38, -5), (-36.5355339059, -1.4644660941), (-33, 0))
            Line((-33, 0), (-38, 0))
            Line((-38, 0), (-38, -5))
        make_face()
    extrude(amount=-F12_T8_DEPTH)

    split(bisect_by=Plane.XZ.offset(-20.5), keep=Keep.TOP)

    split(bisect_by=Plane.YZ.offset(-37.9), keep=Keep.TOP)


with BuildPart() as f1_1:
    add(f1.part)

    # F12_t5: union F12_tool6
    add(f12_tool6.part)

    # F13
    f13_edges = [f1_1.edges().sort_by_distance(p)[0] for p in [
        (-38, 40, -3.25),
        (-43, 40, -3.25),
        (38, 40, -3.25),
        (43, 40, -3.25),
        (43, 37.949747, -12.949747),
        (43, -10, -15),
        (43, -57.949747, -12.949747),
        (43, -60, -4),
        (38, -57.949747, -12.949747),
        (38, -60, -4),
        (38, 37.949747, -12.949747),
        (38, -10, -15),
        (-38, -60, -4),
        (-38, 37.949747, -12.949747),
        (-38, -10, -15),
        (-38, -57.949747, -12.949747),
        (-43, -57.949747, -12.949747),
        (-43, -10, -15),
        (-43, 37.949747, -12.949747),
        (-43, -60, -4),
    ]]
    fillet(f13_edges, radius=F13_R)


solid = f1_1.part
